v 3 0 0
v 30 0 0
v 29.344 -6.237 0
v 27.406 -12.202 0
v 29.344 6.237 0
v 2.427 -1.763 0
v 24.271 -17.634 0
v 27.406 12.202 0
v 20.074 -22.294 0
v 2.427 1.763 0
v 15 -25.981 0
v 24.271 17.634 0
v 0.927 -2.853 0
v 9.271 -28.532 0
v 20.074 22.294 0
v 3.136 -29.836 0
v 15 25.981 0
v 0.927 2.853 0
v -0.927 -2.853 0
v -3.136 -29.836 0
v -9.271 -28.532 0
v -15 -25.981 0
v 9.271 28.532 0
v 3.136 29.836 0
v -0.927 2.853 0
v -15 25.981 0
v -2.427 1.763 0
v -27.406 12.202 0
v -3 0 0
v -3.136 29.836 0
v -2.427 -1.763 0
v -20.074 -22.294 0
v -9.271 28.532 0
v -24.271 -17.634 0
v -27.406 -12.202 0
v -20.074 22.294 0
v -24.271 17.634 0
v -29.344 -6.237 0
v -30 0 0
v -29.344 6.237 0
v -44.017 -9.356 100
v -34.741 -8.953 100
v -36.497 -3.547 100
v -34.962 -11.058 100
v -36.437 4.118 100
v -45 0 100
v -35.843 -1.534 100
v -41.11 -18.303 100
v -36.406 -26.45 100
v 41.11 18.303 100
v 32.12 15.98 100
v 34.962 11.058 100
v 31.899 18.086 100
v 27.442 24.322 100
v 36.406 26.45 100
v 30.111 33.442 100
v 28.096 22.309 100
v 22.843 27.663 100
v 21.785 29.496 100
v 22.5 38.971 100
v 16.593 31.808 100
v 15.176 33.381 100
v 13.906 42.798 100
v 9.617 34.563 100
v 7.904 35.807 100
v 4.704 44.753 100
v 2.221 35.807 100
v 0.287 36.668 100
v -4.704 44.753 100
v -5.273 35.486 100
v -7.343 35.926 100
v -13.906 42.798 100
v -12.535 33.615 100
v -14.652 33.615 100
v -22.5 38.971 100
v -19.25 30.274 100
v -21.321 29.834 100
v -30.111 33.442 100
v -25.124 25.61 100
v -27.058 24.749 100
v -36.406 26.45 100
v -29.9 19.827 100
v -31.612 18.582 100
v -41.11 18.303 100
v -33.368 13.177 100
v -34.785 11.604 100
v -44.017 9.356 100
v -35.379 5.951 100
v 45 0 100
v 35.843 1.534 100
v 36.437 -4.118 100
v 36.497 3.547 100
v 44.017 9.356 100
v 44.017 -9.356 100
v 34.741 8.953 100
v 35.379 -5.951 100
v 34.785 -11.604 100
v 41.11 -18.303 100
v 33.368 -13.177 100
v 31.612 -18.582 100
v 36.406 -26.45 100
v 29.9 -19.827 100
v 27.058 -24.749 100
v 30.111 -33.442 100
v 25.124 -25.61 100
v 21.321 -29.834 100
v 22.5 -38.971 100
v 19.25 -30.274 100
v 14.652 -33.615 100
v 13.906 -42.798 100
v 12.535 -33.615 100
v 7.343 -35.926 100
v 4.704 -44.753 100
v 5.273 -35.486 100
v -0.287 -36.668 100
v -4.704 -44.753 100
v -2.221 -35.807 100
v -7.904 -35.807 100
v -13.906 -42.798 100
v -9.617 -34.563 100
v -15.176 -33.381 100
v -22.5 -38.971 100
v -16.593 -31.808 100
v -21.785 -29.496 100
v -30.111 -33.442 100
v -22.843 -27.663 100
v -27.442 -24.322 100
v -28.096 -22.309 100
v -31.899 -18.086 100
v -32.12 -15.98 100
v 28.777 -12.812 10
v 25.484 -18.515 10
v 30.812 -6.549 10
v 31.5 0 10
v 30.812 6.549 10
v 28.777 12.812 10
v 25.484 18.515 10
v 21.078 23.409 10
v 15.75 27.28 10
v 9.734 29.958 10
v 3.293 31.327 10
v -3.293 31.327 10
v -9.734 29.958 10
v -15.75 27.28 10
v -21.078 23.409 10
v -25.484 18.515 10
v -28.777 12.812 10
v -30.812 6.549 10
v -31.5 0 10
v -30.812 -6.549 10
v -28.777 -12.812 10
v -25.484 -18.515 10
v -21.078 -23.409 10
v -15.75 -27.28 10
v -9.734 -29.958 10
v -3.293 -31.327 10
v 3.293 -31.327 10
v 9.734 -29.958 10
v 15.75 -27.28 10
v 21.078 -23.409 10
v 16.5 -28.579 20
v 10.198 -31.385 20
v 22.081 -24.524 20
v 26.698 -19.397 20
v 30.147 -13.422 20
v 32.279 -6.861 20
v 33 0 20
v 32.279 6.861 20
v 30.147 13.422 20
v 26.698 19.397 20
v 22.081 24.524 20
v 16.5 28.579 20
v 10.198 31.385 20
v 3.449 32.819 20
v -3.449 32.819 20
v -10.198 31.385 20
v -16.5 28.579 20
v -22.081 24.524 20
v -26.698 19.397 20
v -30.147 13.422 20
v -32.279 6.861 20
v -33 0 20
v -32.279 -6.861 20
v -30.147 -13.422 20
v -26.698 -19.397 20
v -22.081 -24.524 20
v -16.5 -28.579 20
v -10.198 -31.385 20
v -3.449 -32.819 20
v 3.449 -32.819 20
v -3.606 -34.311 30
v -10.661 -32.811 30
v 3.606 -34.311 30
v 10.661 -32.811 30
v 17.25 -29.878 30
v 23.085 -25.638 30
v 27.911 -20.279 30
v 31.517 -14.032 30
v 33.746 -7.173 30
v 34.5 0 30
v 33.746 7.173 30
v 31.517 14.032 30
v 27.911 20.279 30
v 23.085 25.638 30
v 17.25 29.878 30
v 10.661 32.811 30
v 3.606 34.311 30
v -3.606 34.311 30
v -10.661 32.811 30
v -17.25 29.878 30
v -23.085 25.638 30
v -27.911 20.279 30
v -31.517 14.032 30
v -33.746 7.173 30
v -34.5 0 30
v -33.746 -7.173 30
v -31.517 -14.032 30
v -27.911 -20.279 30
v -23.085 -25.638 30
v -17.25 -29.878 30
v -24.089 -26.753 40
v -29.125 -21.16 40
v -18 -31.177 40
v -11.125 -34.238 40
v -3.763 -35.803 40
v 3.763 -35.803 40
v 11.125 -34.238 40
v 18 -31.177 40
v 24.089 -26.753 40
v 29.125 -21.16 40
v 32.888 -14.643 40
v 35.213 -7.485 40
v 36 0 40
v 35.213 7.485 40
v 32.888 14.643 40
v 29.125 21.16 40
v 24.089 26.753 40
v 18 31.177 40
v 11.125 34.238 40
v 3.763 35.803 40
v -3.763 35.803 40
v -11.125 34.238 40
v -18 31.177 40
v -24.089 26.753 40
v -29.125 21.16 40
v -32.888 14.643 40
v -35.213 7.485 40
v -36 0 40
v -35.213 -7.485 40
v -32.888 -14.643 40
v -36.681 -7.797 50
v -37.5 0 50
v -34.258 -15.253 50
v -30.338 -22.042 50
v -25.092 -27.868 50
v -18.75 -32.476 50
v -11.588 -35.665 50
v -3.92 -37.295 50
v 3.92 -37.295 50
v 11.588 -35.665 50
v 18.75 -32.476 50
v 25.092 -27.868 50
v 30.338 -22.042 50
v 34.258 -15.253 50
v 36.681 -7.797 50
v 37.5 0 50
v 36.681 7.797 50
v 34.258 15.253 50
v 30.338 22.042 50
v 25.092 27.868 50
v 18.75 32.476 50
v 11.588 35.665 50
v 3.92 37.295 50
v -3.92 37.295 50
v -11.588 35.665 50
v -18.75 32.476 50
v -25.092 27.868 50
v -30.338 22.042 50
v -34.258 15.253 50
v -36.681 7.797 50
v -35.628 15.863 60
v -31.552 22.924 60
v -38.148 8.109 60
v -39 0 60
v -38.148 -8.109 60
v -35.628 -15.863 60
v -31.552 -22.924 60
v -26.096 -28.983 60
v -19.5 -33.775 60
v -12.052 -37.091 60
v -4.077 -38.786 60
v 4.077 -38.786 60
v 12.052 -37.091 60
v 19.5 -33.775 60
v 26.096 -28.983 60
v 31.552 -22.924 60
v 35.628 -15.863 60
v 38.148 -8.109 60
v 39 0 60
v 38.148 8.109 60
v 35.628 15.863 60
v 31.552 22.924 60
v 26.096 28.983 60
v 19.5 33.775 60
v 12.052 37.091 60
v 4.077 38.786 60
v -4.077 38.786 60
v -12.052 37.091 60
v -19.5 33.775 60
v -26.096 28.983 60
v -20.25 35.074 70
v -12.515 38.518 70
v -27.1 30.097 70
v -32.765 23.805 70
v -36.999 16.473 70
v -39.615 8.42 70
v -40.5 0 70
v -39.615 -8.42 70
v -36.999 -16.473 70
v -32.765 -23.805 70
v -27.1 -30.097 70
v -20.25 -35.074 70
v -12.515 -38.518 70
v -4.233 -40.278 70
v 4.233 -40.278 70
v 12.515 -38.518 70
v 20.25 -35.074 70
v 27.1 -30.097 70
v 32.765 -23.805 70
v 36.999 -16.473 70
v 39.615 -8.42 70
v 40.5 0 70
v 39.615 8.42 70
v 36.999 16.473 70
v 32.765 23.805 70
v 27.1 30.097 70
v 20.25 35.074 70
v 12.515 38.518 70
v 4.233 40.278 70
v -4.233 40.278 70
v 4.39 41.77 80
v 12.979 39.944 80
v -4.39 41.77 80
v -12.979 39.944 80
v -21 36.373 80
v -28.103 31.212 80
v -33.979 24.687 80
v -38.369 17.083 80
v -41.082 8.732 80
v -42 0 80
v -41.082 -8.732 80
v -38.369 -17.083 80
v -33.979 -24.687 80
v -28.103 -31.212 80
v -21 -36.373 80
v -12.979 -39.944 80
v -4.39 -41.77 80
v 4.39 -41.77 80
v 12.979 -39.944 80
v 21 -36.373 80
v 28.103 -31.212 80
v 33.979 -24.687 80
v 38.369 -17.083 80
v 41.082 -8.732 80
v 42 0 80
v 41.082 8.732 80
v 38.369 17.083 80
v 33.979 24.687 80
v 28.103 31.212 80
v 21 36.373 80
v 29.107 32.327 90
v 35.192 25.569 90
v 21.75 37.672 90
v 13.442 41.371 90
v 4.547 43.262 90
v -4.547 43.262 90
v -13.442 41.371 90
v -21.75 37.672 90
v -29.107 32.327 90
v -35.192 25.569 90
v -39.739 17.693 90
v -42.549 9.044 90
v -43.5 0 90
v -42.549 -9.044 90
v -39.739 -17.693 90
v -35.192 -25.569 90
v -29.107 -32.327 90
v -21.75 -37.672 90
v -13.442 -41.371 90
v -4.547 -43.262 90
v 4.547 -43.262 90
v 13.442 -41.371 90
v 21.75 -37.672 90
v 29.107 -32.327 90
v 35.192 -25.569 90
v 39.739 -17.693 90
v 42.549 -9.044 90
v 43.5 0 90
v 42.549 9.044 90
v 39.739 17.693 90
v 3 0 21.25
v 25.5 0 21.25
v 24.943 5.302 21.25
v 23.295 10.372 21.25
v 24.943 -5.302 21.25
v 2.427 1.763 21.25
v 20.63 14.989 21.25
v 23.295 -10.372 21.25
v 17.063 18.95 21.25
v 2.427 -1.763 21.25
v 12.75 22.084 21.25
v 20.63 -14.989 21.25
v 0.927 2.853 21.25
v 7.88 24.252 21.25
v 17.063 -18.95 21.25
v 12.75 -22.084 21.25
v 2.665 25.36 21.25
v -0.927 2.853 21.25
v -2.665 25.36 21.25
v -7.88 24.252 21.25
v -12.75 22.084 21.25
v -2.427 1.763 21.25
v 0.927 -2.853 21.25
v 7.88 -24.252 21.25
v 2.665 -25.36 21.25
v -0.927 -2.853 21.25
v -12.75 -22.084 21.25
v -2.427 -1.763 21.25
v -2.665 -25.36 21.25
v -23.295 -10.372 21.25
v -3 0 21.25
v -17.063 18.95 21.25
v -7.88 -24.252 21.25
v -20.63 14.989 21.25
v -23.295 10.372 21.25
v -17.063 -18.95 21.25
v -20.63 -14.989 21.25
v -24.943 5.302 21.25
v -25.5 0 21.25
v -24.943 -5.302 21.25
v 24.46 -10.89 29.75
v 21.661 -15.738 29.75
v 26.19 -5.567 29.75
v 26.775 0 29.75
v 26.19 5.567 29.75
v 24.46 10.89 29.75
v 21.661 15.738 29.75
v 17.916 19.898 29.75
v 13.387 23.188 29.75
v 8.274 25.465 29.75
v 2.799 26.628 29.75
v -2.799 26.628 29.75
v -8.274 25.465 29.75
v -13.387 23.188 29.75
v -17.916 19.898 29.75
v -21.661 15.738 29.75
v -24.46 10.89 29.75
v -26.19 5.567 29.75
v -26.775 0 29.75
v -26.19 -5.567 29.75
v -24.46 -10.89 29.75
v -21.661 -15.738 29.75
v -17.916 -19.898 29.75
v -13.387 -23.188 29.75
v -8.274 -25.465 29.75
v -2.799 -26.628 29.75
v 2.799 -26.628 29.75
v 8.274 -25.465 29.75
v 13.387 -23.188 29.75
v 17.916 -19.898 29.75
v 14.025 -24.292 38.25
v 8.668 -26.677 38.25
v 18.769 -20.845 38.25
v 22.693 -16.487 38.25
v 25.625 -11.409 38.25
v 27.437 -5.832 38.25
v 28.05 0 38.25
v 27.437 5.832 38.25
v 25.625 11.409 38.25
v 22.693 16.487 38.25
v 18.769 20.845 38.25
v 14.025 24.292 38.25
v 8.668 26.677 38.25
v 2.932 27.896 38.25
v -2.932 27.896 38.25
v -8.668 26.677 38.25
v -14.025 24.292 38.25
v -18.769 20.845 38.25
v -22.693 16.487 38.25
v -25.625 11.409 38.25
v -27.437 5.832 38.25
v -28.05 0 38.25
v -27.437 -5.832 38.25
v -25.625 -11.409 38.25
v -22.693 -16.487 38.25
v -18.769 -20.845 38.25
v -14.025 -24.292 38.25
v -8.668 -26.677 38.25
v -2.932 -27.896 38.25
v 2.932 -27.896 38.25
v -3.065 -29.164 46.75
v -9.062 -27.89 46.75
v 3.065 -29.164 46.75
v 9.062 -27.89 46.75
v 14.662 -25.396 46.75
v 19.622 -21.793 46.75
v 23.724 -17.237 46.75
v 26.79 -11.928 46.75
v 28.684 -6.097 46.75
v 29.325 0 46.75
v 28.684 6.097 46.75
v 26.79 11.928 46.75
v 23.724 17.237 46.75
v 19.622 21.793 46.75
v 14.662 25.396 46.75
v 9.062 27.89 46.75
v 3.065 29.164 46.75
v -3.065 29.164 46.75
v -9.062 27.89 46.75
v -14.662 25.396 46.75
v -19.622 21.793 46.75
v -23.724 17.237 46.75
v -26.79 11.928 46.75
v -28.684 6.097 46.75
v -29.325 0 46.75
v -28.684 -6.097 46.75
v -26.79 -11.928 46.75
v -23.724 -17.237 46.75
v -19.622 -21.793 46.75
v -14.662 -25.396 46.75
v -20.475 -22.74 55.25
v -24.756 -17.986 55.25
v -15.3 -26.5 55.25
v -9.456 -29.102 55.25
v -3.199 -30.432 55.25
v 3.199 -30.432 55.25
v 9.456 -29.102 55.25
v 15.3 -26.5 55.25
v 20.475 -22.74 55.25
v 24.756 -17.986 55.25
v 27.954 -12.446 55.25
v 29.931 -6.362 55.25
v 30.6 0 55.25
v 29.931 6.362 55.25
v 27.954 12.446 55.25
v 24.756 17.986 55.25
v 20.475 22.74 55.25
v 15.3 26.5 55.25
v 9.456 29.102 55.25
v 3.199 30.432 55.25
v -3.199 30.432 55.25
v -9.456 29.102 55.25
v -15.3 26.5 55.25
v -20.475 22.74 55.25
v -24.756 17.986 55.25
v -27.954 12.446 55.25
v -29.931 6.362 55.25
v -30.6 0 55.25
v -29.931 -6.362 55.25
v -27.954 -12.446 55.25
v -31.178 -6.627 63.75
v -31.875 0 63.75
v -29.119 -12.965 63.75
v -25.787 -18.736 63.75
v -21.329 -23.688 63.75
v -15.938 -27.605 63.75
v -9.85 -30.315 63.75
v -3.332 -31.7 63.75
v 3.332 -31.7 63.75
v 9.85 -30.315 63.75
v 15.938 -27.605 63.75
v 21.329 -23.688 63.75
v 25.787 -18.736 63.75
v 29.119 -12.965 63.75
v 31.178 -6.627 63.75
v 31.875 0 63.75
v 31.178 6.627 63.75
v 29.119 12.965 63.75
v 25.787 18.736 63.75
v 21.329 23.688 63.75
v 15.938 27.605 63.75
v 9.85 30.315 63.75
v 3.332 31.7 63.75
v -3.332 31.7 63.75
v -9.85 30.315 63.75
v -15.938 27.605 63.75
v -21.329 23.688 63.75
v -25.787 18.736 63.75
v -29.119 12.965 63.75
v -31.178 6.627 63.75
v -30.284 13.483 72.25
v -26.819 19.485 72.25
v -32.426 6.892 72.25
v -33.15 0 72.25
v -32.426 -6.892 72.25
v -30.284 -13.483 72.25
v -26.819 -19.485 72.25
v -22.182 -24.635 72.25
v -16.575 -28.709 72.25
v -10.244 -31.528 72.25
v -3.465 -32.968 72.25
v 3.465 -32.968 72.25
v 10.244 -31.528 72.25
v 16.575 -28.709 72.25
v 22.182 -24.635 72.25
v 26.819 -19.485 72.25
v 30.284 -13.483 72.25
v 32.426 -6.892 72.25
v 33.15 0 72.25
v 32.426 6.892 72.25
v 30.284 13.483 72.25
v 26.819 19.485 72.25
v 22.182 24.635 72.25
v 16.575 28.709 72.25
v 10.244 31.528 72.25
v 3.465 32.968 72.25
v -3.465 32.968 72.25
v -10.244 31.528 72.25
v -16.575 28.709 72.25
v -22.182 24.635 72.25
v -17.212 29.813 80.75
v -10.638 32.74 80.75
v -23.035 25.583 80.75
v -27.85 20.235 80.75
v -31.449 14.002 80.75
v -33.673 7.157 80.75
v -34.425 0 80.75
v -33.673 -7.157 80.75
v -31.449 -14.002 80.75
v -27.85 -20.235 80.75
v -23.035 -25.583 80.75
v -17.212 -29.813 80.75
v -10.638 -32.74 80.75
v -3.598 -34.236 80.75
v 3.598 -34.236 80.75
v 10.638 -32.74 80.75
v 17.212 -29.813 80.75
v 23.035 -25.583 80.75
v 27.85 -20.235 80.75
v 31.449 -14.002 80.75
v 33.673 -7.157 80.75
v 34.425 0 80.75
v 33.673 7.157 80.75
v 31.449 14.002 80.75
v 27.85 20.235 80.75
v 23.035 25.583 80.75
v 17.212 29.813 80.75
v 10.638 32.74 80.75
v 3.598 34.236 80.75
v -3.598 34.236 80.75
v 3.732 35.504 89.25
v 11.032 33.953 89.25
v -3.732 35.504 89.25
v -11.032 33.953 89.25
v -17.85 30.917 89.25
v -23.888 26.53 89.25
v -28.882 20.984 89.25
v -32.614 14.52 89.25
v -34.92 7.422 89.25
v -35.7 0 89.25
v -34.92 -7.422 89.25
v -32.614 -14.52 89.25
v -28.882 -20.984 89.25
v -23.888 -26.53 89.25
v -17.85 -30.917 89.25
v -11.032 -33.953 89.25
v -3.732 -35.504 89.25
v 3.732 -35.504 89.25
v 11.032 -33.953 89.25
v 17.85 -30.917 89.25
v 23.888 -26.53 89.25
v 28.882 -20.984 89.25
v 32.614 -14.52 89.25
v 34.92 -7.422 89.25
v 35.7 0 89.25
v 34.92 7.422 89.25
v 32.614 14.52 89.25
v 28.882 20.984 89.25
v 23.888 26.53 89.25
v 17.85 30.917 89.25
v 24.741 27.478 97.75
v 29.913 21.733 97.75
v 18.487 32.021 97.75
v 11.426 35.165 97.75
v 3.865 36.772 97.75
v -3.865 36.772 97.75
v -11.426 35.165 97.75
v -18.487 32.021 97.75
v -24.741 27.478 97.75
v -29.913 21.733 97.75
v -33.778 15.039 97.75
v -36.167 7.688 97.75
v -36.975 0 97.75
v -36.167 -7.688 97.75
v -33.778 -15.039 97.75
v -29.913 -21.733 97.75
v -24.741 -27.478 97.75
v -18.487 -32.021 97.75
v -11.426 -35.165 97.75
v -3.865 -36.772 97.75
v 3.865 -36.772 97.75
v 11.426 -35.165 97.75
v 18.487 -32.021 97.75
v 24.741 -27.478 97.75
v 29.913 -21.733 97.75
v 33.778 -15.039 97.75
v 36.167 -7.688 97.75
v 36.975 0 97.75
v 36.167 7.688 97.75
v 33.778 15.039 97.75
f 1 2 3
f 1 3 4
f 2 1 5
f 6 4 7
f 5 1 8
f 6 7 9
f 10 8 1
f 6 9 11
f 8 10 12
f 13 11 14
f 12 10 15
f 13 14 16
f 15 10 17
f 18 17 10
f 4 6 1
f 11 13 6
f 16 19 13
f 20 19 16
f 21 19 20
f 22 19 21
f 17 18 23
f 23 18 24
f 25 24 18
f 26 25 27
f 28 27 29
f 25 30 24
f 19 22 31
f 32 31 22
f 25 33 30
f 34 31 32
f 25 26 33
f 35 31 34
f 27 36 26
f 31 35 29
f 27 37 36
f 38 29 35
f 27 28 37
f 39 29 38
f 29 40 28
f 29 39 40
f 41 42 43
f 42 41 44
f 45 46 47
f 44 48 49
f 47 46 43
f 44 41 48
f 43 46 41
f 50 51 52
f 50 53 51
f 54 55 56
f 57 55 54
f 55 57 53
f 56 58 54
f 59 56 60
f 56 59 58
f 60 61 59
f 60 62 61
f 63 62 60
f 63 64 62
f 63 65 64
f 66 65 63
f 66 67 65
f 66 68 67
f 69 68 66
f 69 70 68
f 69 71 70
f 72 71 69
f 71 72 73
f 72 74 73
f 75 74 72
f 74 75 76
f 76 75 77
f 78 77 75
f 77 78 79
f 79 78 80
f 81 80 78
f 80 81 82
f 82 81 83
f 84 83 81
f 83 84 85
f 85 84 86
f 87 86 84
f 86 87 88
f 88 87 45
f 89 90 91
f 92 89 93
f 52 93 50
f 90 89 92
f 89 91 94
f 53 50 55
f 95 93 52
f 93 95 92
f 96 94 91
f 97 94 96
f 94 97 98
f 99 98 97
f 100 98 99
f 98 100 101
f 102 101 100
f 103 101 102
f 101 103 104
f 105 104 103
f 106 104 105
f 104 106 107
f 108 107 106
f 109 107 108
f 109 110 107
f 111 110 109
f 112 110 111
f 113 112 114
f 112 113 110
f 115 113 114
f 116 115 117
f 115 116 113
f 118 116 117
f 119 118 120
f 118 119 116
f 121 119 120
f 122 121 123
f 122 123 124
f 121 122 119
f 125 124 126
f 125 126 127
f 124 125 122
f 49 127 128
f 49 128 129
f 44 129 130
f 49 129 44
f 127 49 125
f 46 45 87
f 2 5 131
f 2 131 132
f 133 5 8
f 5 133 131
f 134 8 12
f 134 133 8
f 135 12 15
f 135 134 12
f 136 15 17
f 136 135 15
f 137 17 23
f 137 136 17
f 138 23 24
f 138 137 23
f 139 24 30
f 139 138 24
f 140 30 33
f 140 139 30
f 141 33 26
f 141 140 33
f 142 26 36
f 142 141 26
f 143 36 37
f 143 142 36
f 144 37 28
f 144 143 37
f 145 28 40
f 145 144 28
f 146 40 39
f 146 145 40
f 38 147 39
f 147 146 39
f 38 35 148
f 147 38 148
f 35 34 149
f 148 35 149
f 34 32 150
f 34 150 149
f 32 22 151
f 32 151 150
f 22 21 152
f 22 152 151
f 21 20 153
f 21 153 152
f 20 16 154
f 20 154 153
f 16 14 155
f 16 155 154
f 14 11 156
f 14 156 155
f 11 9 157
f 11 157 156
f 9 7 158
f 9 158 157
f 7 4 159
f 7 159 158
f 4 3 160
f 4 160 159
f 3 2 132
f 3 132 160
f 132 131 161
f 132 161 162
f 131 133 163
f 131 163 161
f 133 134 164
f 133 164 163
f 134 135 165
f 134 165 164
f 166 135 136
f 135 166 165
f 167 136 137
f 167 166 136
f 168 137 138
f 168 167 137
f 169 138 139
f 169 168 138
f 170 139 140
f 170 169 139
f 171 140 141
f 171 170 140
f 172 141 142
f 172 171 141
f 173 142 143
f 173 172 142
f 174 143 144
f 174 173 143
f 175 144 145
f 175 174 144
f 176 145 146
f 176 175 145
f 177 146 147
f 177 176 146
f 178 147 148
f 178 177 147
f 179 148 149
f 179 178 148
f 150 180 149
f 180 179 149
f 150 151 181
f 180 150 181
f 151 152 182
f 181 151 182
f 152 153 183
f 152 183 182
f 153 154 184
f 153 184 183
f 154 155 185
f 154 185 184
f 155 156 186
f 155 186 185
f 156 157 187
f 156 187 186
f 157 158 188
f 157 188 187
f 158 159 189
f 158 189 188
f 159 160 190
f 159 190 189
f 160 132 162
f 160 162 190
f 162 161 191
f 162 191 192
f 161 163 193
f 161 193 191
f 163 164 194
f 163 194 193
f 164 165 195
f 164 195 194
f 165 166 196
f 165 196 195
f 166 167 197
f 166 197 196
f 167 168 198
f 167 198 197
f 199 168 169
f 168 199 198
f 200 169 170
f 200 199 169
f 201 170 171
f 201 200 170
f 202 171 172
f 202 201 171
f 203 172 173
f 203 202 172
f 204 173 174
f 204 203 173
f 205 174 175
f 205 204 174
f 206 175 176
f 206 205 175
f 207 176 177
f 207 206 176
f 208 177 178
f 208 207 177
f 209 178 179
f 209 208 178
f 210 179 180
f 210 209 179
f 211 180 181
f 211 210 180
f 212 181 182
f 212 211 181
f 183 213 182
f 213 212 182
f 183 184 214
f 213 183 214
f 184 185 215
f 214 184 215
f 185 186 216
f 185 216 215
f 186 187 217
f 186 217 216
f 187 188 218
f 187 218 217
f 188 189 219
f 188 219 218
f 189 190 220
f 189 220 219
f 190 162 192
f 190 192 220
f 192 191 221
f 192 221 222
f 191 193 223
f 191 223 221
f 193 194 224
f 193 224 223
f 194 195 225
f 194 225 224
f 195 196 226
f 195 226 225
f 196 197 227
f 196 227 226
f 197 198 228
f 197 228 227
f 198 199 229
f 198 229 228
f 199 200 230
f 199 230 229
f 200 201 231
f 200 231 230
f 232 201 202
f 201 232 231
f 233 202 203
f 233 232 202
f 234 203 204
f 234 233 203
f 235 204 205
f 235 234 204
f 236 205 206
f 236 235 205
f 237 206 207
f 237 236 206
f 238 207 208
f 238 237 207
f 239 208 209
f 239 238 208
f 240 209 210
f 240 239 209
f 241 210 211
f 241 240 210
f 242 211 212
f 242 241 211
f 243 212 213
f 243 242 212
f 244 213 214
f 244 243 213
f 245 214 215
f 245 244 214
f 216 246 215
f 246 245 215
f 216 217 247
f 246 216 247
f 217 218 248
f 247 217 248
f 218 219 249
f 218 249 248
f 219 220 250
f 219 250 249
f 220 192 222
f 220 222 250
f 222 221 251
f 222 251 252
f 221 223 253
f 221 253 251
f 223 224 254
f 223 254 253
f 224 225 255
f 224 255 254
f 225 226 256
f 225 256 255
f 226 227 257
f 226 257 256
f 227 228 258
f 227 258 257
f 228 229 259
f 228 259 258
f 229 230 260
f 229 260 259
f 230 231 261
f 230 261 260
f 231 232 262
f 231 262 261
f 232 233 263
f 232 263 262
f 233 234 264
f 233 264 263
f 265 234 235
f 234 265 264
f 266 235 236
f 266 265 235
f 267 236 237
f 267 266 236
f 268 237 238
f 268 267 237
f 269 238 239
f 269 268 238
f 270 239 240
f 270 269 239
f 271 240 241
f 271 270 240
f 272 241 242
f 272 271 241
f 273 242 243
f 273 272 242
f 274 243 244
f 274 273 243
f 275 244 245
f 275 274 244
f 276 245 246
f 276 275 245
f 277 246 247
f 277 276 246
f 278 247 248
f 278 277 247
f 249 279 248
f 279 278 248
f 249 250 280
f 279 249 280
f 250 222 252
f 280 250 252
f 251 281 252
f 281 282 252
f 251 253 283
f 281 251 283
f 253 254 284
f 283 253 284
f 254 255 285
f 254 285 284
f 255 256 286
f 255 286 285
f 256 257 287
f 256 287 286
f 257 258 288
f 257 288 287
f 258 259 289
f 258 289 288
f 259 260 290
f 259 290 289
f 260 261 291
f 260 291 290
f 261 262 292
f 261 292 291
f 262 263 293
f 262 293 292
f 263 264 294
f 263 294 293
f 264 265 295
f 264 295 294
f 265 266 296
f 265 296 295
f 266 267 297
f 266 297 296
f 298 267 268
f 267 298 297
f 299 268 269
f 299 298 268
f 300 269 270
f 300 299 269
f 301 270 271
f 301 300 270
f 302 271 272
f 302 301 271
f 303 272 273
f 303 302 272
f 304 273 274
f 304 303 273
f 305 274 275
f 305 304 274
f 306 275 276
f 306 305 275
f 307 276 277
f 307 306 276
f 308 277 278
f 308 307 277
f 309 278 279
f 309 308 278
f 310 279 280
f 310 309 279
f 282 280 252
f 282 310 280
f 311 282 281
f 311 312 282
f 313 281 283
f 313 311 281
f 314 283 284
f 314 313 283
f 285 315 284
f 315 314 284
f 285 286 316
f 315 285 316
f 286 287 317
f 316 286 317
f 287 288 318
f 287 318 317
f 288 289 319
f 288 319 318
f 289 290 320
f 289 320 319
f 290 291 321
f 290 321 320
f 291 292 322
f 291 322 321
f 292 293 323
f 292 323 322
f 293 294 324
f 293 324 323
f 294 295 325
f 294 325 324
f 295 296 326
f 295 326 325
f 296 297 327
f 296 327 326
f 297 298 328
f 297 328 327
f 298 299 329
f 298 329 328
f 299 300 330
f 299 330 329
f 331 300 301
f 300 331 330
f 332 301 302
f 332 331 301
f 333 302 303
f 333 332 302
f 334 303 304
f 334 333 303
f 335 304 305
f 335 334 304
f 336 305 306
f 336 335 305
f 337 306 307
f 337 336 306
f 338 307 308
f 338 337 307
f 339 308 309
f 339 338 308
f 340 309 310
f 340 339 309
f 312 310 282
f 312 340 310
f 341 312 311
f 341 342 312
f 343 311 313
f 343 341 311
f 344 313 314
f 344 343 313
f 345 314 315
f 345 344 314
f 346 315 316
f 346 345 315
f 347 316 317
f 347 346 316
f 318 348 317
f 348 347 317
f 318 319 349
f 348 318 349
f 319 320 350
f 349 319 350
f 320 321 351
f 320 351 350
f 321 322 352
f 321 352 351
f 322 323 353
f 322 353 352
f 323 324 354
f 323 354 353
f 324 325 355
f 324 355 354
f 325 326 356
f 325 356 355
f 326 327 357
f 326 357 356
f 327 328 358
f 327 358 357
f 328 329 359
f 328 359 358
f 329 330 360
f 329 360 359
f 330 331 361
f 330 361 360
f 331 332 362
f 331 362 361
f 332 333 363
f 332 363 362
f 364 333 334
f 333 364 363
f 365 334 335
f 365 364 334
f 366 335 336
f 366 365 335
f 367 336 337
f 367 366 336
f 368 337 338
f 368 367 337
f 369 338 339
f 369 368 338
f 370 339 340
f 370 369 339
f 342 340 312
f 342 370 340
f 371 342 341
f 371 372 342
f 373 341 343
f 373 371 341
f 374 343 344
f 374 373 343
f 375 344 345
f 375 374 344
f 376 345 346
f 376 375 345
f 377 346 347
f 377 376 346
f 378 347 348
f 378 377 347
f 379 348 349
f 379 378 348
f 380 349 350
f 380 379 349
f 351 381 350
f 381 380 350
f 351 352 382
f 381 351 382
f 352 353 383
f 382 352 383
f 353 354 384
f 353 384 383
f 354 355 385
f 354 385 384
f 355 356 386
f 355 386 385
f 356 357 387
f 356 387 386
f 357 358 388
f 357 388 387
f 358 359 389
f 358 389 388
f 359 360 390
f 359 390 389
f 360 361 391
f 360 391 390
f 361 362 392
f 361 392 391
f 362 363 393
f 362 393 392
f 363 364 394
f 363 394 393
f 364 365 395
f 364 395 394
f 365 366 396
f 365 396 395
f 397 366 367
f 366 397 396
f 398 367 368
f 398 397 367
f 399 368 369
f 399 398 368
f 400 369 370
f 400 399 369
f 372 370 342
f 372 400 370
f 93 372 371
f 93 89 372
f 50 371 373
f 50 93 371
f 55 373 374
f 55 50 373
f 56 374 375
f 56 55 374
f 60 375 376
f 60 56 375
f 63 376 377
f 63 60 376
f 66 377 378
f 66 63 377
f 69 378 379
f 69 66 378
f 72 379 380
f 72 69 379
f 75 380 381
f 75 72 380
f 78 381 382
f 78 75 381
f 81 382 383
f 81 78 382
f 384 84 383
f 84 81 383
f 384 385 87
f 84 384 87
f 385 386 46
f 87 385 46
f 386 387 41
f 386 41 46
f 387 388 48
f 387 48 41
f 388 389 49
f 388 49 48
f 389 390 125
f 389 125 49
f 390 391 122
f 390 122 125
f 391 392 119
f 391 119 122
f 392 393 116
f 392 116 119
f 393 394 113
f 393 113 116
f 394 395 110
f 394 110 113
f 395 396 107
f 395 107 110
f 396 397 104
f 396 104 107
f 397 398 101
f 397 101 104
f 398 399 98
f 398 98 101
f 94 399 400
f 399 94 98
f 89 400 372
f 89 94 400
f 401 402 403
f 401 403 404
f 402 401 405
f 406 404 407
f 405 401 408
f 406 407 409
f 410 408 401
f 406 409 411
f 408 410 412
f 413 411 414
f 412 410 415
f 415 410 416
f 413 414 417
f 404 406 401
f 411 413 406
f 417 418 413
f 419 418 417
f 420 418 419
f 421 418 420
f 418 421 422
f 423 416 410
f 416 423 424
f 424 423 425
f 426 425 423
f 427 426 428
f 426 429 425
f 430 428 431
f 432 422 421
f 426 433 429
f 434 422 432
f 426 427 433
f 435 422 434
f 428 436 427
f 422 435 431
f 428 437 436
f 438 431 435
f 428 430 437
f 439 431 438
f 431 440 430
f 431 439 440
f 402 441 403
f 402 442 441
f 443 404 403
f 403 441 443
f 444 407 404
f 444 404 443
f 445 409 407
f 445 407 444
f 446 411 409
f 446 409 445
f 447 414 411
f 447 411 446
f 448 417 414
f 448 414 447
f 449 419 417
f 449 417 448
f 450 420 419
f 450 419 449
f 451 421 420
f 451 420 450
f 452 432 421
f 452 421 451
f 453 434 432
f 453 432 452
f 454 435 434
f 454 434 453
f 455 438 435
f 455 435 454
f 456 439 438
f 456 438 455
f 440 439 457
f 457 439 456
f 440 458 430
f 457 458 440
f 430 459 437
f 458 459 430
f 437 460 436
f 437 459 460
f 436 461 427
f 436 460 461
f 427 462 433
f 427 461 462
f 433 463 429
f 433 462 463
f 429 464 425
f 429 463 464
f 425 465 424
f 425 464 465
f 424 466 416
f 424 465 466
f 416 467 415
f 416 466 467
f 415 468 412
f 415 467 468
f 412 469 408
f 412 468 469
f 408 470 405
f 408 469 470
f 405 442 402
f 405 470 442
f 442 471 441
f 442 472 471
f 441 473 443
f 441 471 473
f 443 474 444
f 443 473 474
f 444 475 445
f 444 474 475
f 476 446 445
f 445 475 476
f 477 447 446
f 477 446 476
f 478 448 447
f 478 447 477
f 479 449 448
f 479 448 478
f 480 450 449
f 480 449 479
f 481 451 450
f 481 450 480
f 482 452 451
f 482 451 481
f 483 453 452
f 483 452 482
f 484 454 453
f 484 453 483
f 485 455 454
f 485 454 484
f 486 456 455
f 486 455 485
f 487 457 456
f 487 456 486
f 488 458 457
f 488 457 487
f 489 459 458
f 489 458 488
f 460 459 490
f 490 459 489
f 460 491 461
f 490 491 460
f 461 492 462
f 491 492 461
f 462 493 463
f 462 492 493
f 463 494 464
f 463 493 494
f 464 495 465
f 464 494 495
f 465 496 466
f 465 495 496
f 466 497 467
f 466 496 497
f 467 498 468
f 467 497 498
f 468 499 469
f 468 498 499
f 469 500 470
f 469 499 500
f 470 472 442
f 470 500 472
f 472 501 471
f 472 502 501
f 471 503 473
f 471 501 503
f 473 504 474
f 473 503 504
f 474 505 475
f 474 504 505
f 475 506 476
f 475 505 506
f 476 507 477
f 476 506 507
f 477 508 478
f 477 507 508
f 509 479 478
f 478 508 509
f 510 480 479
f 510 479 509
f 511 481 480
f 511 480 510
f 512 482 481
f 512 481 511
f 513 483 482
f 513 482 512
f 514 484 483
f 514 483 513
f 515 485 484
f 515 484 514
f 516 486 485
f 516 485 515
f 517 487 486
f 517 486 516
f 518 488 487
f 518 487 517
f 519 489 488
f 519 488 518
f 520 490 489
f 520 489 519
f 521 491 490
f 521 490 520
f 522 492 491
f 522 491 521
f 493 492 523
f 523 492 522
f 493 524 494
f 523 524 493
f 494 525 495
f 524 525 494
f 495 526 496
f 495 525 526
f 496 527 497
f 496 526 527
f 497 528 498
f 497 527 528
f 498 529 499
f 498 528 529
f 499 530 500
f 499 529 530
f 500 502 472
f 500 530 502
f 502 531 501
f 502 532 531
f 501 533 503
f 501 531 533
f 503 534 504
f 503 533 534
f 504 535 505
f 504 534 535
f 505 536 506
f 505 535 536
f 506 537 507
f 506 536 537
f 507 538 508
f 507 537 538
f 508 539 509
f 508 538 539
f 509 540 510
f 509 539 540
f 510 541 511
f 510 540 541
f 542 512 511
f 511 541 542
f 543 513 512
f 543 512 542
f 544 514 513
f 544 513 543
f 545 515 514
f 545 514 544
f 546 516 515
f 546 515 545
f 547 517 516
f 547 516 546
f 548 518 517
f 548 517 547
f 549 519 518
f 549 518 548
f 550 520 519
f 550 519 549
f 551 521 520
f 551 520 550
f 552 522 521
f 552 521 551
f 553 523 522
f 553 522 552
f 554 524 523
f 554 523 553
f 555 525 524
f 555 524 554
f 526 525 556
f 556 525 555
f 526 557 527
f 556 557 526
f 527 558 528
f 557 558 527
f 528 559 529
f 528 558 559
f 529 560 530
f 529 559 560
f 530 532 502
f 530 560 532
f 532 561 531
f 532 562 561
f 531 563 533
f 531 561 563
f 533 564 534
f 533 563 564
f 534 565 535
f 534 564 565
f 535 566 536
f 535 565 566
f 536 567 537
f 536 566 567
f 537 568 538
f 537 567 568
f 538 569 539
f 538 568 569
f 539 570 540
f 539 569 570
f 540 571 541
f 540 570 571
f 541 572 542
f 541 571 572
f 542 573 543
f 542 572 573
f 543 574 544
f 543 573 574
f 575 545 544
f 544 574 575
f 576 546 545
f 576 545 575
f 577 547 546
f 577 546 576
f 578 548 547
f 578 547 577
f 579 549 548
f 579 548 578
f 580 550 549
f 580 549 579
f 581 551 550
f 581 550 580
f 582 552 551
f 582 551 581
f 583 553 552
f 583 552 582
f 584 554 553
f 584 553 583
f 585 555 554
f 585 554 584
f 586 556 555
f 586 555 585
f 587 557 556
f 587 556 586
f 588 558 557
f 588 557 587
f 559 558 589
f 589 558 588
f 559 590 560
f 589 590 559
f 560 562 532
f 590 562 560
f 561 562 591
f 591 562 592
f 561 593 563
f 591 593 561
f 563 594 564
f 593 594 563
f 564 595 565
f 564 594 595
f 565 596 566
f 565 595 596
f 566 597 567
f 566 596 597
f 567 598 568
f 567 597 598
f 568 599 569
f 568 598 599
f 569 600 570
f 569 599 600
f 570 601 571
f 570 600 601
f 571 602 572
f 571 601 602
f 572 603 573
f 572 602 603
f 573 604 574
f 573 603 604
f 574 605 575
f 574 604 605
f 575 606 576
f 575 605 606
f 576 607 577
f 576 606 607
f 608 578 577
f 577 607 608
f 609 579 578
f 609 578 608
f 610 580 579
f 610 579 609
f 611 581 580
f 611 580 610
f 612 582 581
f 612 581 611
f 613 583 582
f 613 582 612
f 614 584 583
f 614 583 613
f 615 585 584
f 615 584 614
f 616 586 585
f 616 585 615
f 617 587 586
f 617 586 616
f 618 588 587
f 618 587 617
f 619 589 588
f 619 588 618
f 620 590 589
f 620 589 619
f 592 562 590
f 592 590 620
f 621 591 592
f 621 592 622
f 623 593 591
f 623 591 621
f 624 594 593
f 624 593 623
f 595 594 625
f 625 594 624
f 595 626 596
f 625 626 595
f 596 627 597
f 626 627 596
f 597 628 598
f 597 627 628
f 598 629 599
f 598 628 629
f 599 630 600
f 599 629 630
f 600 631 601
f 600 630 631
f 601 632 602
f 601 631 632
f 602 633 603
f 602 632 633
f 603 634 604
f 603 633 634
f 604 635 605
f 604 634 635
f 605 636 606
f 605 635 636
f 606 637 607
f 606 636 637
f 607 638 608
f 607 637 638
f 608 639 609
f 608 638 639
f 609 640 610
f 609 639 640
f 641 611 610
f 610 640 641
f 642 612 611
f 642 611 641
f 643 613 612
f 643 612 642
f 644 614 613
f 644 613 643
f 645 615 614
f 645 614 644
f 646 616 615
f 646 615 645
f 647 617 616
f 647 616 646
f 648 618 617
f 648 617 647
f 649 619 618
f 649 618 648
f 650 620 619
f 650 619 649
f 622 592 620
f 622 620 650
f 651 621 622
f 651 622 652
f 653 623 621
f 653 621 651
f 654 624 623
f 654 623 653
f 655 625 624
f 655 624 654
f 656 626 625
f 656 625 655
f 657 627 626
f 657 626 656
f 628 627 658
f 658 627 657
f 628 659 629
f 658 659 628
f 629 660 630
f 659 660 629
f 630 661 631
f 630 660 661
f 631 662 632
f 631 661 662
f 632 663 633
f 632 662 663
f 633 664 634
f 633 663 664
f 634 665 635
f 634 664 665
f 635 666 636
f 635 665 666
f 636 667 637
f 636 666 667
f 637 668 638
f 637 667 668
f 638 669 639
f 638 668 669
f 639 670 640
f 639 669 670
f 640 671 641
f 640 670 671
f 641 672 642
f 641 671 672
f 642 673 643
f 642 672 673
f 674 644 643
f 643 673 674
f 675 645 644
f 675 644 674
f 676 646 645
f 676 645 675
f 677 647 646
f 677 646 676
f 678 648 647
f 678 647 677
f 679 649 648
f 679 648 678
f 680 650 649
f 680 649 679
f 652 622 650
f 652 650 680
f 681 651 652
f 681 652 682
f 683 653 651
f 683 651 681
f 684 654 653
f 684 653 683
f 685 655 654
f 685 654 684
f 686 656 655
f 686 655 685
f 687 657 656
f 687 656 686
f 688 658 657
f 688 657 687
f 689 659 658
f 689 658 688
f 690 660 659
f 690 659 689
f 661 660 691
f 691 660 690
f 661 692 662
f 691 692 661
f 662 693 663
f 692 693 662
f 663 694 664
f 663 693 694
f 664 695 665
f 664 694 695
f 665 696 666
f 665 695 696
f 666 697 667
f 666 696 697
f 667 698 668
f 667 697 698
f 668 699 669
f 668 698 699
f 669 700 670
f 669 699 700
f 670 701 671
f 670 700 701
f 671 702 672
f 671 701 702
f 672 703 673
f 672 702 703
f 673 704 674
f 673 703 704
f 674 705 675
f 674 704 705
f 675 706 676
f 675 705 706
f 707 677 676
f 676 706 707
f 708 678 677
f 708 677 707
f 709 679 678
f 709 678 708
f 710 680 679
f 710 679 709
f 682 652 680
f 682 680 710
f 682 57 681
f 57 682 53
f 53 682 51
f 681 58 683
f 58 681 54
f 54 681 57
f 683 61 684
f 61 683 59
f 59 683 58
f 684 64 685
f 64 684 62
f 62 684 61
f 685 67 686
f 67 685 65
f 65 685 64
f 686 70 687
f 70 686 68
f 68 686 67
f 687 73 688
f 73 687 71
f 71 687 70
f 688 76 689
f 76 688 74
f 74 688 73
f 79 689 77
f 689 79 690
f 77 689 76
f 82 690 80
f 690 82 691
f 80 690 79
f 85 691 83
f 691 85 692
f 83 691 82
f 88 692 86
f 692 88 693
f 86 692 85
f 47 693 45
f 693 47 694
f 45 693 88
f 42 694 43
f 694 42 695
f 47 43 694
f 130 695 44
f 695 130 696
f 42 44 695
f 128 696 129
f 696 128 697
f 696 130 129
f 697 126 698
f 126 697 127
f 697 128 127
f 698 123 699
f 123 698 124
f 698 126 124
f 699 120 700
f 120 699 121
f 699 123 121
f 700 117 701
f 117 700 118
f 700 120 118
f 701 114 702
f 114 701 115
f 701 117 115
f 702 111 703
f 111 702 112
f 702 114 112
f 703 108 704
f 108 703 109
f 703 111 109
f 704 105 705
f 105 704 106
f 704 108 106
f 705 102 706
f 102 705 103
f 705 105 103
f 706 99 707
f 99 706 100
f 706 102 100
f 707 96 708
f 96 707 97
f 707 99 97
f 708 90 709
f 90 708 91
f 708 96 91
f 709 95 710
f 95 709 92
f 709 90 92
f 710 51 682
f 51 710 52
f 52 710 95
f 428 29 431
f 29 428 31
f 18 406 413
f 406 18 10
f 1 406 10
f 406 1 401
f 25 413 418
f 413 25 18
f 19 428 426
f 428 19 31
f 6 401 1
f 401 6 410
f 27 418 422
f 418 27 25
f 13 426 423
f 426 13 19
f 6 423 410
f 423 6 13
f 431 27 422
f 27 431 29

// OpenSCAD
Height = 100;
Twist = 360;
Scale = 1.5;
Slices = 10;
Radius = 30;
//Set to 0 if not hole desired
HoleRadius = 3;

difference(){
    translate([0, 0, Height/2]){
        linear_extrude(height = Height, twist = Twist, scale = Scale, center = true, slices = Slices)
            circle(Radius);
    }
    scale([0.85,0.85,0.85]){
        translate([0, 0, Height*.75]){
            linear_extrude(height = Height, twist = Twist, scale = Scale,        center = true, slices = Slices)
                circle(Radius);
        }
    }
    cylinder(100, HoleRadius, HoleRadius, center=true);
}
